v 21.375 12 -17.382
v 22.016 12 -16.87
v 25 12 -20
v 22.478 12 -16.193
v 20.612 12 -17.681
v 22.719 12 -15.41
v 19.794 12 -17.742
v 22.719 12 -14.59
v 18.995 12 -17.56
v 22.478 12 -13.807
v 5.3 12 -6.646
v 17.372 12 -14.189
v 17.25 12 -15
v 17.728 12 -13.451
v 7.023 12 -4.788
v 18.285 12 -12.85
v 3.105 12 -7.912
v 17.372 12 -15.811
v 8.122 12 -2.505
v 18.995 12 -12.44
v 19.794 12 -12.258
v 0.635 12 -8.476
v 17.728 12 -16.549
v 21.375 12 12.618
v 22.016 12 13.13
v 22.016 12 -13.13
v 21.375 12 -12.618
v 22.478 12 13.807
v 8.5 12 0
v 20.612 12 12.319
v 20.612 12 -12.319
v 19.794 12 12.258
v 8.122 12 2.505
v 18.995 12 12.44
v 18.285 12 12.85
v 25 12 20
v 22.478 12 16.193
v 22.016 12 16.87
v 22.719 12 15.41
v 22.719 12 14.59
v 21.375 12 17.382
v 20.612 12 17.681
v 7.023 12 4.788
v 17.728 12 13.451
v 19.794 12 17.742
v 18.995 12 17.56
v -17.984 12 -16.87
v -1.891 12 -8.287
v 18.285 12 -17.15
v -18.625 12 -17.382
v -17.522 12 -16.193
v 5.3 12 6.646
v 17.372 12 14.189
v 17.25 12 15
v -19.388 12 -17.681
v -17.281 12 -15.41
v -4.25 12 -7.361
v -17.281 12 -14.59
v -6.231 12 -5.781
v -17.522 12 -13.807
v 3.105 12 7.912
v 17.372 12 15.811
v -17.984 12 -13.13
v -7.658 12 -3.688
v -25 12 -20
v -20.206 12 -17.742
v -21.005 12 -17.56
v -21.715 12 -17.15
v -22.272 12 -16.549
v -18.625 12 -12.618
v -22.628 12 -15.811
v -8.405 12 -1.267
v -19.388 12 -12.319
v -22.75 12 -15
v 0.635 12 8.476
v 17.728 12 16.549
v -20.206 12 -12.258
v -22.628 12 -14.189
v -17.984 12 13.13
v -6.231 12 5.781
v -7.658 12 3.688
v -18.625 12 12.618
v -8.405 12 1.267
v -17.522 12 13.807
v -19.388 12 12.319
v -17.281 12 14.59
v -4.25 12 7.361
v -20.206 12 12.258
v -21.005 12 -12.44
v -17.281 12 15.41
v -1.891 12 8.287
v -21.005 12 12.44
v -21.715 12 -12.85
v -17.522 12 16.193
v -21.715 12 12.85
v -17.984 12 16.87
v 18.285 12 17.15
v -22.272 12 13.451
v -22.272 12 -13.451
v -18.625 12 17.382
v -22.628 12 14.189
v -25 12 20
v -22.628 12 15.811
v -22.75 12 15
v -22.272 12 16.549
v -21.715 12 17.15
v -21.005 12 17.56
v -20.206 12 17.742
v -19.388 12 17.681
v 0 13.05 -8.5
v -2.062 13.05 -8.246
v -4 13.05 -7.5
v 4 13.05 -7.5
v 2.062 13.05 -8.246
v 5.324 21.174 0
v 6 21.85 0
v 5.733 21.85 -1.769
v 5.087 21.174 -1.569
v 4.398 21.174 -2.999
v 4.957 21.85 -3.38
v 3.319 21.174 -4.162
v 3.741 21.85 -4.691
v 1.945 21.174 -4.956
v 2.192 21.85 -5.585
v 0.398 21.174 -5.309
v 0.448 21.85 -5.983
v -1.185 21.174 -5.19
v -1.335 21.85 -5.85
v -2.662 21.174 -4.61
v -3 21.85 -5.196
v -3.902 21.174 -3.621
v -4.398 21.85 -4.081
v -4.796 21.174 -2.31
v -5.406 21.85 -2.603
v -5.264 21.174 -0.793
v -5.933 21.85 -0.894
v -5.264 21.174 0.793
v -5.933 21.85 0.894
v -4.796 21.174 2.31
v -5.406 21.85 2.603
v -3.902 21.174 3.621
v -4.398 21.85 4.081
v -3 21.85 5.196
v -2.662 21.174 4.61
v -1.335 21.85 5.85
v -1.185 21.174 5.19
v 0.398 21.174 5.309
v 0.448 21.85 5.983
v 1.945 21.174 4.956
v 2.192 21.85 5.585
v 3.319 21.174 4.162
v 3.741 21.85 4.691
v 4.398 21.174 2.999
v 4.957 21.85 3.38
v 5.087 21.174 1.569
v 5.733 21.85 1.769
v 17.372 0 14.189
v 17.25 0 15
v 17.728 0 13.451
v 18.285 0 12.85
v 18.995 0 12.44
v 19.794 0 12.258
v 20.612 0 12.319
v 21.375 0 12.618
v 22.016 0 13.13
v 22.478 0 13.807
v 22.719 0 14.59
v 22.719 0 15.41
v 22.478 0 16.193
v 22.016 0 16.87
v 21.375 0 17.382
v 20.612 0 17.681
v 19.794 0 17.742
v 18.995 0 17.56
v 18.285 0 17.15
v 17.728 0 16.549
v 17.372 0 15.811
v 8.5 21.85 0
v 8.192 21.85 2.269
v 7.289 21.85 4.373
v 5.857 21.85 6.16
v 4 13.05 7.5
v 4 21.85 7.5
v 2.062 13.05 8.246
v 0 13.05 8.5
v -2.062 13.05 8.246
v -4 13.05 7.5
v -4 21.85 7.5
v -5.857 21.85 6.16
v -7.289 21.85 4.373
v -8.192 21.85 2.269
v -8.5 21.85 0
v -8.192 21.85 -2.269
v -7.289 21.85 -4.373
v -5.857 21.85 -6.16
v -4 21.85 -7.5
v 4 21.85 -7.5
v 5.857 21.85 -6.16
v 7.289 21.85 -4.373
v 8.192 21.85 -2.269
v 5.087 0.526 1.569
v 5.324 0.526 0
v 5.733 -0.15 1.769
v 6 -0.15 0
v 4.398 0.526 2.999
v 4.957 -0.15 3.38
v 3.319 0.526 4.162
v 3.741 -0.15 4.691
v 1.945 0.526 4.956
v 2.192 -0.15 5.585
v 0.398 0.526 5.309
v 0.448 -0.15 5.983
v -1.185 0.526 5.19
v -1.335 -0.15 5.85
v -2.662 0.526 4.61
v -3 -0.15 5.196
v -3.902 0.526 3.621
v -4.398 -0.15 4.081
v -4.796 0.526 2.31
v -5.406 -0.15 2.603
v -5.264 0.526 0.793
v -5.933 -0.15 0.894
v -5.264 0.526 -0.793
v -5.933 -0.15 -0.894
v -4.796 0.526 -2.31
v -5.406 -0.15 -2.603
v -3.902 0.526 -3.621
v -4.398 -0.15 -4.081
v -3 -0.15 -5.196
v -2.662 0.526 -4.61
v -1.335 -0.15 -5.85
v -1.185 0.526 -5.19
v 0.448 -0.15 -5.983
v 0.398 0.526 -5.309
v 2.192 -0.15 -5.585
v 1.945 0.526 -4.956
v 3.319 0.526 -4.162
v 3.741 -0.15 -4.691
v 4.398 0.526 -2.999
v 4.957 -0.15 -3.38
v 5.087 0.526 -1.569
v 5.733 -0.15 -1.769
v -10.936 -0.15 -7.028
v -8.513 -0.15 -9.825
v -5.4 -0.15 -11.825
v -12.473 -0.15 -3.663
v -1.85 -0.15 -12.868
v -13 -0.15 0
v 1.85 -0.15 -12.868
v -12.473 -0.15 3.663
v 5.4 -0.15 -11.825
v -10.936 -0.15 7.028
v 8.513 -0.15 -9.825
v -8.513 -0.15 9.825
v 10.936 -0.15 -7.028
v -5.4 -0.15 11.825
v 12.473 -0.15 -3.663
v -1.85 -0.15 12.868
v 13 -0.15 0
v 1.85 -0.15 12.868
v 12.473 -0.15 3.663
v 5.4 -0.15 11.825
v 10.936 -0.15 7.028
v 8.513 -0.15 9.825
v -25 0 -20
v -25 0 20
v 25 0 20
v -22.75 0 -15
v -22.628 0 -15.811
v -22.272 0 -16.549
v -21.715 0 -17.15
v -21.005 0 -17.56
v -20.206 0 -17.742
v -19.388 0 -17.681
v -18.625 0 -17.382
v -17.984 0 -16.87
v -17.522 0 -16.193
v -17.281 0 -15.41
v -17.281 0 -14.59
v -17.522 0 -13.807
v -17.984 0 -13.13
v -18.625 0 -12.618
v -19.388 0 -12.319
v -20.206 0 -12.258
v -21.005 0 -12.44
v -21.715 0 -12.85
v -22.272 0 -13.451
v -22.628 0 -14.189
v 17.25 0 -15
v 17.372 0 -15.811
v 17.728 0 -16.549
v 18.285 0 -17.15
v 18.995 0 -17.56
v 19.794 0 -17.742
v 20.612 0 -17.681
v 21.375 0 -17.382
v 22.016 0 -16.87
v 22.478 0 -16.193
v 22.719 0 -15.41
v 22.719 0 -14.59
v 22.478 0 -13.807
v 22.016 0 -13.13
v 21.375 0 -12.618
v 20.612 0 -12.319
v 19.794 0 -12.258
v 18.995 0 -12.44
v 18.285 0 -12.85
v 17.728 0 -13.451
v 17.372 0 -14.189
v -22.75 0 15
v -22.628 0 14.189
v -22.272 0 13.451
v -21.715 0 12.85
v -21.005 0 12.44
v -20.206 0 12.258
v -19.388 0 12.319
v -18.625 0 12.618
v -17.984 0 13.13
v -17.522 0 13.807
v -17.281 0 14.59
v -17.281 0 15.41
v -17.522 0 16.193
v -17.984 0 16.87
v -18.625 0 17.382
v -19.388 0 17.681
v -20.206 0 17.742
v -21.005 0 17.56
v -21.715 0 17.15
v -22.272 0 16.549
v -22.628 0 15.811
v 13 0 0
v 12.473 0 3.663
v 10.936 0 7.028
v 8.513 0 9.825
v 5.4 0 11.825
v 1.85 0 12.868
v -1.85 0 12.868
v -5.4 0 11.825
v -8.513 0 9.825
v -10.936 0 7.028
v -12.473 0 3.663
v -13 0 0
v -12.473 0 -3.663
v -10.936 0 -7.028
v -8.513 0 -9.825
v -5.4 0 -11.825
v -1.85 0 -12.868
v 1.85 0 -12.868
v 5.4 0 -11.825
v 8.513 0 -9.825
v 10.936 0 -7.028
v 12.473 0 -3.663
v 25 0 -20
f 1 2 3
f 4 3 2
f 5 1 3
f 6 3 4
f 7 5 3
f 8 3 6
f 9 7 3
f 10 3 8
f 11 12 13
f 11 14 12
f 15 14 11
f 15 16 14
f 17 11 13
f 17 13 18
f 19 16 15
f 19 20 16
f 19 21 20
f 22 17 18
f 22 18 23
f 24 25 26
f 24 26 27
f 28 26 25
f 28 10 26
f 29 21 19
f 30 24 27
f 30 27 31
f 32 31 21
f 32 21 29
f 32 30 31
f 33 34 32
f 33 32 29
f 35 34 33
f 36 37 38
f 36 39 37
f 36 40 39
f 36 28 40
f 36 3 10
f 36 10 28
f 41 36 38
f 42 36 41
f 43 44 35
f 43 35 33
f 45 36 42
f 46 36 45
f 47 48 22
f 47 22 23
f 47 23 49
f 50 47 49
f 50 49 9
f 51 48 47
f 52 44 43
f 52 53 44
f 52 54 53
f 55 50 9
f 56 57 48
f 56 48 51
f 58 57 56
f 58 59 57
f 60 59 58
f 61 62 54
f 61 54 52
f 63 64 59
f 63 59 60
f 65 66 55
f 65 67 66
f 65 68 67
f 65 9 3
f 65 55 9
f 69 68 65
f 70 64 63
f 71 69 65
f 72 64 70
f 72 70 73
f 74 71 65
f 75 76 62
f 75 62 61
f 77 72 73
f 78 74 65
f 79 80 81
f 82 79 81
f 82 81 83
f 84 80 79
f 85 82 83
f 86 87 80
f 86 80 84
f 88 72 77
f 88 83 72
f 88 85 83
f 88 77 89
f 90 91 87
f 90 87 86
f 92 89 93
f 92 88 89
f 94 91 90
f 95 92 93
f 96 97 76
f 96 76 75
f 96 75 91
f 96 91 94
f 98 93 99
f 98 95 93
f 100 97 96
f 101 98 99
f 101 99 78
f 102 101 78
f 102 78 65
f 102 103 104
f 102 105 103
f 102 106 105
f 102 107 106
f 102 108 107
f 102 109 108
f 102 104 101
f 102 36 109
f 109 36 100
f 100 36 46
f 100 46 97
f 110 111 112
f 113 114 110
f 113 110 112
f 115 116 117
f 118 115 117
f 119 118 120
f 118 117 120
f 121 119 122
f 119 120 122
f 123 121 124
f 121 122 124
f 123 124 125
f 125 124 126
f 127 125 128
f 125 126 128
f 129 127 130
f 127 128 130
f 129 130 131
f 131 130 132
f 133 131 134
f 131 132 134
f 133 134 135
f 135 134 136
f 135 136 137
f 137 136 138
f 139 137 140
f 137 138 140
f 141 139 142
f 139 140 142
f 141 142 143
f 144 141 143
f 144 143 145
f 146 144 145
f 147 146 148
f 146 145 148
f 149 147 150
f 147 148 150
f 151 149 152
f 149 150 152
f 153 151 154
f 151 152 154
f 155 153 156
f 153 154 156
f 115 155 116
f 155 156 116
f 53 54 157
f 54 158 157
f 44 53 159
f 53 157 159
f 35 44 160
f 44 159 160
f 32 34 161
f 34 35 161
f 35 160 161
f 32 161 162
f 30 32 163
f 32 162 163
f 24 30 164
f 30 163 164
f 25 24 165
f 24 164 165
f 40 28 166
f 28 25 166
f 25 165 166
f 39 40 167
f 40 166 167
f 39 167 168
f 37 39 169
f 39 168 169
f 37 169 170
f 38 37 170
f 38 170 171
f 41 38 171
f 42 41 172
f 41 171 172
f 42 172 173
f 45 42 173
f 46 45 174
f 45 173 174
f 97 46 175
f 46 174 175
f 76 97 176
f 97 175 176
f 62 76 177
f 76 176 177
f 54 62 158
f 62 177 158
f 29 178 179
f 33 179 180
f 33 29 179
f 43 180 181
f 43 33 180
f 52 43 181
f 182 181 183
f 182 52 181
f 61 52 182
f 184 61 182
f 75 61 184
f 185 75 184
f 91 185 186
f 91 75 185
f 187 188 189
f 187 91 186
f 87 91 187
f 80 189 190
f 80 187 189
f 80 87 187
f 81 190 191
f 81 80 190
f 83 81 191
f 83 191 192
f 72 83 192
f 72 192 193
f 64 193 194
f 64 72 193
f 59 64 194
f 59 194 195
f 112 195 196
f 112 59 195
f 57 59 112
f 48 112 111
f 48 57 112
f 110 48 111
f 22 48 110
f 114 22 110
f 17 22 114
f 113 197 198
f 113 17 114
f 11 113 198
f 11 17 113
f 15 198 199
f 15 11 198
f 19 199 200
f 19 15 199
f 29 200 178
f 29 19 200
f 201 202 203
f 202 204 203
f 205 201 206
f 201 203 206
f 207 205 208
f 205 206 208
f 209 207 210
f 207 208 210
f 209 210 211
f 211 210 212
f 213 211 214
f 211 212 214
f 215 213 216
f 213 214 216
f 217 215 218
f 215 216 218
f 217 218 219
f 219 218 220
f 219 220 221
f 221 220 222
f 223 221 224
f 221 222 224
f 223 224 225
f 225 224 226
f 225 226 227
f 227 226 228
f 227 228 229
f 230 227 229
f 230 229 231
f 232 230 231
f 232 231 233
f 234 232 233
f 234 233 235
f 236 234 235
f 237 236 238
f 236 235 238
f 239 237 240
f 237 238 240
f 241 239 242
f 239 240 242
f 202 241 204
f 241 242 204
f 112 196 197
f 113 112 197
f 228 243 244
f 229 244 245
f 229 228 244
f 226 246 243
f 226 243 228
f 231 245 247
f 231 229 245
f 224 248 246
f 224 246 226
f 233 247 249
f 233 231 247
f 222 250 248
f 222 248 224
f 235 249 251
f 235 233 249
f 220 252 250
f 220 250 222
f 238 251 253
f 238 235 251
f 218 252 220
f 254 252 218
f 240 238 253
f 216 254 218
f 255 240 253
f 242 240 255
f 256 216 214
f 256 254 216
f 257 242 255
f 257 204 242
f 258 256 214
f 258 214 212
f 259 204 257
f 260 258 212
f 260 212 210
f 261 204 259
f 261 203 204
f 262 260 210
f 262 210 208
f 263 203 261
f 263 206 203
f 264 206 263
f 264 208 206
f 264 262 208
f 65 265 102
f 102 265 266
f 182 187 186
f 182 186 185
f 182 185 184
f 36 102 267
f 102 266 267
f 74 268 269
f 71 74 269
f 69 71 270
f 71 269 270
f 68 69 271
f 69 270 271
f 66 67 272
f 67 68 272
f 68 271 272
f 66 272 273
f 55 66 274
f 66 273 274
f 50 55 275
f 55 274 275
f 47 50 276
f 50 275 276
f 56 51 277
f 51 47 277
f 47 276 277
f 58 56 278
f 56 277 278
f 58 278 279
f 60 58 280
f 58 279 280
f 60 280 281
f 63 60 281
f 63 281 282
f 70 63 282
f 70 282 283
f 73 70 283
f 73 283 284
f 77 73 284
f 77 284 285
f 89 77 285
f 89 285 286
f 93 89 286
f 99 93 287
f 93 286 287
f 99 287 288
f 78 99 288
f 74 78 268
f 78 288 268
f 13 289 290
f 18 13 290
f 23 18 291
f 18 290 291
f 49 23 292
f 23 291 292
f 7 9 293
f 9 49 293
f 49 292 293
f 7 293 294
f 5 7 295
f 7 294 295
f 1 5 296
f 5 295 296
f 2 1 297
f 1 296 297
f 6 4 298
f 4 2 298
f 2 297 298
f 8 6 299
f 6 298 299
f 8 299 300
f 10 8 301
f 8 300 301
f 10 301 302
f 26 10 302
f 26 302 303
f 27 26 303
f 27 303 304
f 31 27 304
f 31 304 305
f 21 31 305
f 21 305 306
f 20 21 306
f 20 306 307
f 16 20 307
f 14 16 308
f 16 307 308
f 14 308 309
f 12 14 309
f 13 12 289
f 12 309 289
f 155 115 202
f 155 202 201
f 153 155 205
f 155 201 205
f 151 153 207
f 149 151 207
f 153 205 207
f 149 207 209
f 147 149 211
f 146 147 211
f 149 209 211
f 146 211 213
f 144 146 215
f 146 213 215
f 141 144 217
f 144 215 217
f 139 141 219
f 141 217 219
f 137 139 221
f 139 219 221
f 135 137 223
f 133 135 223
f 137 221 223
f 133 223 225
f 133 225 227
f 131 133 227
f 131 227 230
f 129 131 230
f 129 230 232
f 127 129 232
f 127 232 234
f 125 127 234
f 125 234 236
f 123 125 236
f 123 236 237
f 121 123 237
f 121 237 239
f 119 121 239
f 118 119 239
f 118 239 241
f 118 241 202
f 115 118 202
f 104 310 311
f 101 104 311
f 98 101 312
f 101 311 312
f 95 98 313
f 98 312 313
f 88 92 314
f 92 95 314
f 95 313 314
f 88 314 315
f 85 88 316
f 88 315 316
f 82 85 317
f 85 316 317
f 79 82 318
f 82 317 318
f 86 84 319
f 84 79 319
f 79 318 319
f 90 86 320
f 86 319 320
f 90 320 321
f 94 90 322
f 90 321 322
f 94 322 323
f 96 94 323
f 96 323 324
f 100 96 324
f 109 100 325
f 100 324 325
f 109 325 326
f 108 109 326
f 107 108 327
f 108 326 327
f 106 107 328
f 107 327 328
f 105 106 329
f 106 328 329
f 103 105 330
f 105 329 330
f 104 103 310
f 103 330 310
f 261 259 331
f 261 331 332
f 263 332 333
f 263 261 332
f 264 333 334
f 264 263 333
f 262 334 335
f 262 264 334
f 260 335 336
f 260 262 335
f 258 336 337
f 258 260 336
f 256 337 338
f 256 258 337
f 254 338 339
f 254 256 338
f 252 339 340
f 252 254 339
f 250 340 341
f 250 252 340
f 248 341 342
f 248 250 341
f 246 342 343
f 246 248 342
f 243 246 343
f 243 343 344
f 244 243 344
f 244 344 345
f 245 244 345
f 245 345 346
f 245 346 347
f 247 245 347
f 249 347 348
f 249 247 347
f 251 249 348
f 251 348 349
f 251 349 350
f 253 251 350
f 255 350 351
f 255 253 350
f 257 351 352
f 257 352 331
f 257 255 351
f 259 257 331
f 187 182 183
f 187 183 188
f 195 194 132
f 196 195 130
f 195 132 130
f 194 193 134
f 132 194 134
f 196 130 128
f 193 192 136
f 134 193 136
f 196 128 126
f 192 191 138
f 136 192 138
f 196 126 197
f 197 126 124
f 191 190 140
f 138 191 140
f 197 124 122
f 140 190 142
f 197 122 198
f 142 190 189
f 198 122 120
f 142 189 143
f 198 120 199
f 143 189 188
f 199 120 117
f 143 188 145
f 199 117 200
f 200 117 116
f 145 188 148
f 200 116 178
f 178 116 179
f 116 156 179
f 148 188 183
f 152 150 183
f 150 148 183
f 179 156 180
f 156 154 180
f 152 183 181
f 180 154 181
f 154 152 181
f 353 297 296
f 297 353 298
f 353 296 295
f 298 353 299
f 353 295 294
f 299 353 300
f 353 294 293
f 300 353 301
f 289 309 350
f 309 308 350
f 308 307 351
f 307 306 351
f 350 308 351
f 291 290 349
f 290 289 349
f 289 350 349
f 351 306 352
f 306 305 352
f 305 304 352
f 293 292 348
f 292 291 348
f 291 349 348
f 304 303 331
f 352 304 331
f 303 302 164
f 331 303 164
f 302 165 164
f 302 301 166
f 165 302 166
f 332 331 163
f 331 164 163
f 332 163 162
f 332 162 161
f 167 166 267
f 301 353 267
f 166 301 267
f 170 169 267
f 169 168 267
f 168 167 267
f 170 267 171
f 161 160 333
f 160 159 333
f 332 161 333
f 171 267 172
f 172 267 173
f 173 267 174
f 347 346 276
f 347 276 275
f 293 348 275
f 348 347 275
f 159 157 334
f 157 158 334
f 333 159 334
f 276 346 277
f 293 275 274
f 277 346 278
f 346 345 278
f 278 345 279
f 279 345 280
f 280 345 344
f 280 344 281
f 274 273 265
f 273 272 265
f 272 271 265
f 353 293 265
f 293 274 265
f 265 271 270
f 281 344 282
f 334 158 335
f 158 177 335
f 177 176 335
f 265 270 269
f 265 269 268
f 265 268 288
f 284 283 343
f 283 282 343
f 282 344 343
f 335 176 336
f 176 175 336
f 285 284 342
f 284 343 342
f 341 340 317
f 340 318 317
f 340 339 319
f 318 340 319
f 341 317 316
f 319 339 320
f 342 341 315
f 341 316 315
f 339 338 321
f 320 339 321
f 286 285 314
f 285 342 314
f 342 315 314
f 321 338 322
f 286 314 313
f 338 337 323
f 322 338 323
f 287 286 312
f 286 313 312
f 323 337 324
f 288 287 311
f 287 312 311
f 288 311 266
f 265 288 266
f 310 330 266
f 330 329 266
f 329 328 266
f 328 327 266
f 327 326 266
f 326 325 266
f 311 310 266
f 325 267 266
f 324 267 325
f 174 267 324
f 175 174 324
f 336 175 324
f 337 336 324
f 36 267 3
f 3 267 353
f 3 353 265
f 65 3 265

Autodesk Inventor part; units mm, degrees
sketch "Skizze_1" plane through (0, 0, 0) normal (0, 1, 0) x (-1, 0, 0)
  line L0 (25, 20) -> (-25, 20)
  line L1 (-25, 20) -> (-25, -20)
  line L2 (-25, -20) -> (25, -20)
  line L3 (25, -20) -> (25, 20)
  circle A0 centre (-20, -15) radius 2.75
  circle A1 centre (-20, 15) radius 2.75
  circle A2 centre (20, -15) radius 2.75
  circle A3 centre (20, 15) radius 2.75
extrude "Extrusion1" add sketch "Skizze_1" along normal blind 12
sketch "Skizze_2" plane through (0, 0, 0) normal (0, 0, 1) x (1, 0, 0)
  line L0 (0, -0.15) -> (0, 21.85)
  line L1 (0, 21.85) -> (8.5, 21.85)
  line L2 (8.5, 21.85) -> (8.5, 5.8)
  line L3 (8.5, 5.8) -> (13, 5.8)
  line L4 (13, 5.8) -> (13, -0.15)
  line L5 (13, -0.15) -> (0, -0.15)
  line L6 (0, -0.15) -> (0, 21.85)
revolve "Revolution1" add sketch "Skizze_2" angle 360 about axis through (0, -0.15, 0) along (0, -1, 0)
sketch "Skizze_3" plane through (0, 21.85, 0) normal (0, 1, 0) x (1, 0, 0)
  line L0 (-15, -15) -> (15, -15)
  line L1 (15, -15) -> (15, -7.5)
  line L2 (15, -7.5) -> (-13.5, -7.5)
  line L3 (-13.5, -7.5) -> (-13.5, 7.5)
  line L4 (-13.5, 7.5) -> (15, 7.5)
  line L5 (15, 7.5) -> (15, 15)
  line L6 (15, 15) -> (-15, 15)
  line L7 (-15, 15) -> (-15, -15)
extrude "Extrusion2" cut sketch "Skizze_3" along normal mid plane 17.6
sketch "Skizze_6" plane through (0, 0, 0) normal (0, 0, 1) x (1, 0, 0)
  line L0 (0, -0.15) -> (0, 21.85)
  line L1 (0, 21.85) -> (6, 21.85)
  line L2 (6, 21.85) -> (5.3235, 21.1735)
  line L3 (5.3235, 21.1735) -> (5.3235, 0.5265)
  line L4 (5.3235, 0.5265) -> (6, -0.15)
  line L5 (6, -0.15) -> (0, -0.15)
  line L6 (0, -0.15) -> (0, 21.85)
revolve "Revolution2" cut sketch "Skizze_6" angle 360 about axis through (0, -0.15, 0) along (0, -1, 0)
thread "Thread1" size "M12x1.25" class "6H" standard "ISO Metric profile" full length
ref_plane "FDT_CYLINDER_XY" through (0, 22, 0) normal (0, 1, 0) x (1, 0, 0)
ref_plane "FDT_CYLINDER_YZ" through (0, 22, 0) normal (1, 0, 0) x (0, 0, -1)
ref_plane "FDT_CYLINDER_ZX" through (0, 22, 0) normal (0, 0, -1) x (0, 1, 0)
properties part number "36126 KSZ-M12x1,25"
